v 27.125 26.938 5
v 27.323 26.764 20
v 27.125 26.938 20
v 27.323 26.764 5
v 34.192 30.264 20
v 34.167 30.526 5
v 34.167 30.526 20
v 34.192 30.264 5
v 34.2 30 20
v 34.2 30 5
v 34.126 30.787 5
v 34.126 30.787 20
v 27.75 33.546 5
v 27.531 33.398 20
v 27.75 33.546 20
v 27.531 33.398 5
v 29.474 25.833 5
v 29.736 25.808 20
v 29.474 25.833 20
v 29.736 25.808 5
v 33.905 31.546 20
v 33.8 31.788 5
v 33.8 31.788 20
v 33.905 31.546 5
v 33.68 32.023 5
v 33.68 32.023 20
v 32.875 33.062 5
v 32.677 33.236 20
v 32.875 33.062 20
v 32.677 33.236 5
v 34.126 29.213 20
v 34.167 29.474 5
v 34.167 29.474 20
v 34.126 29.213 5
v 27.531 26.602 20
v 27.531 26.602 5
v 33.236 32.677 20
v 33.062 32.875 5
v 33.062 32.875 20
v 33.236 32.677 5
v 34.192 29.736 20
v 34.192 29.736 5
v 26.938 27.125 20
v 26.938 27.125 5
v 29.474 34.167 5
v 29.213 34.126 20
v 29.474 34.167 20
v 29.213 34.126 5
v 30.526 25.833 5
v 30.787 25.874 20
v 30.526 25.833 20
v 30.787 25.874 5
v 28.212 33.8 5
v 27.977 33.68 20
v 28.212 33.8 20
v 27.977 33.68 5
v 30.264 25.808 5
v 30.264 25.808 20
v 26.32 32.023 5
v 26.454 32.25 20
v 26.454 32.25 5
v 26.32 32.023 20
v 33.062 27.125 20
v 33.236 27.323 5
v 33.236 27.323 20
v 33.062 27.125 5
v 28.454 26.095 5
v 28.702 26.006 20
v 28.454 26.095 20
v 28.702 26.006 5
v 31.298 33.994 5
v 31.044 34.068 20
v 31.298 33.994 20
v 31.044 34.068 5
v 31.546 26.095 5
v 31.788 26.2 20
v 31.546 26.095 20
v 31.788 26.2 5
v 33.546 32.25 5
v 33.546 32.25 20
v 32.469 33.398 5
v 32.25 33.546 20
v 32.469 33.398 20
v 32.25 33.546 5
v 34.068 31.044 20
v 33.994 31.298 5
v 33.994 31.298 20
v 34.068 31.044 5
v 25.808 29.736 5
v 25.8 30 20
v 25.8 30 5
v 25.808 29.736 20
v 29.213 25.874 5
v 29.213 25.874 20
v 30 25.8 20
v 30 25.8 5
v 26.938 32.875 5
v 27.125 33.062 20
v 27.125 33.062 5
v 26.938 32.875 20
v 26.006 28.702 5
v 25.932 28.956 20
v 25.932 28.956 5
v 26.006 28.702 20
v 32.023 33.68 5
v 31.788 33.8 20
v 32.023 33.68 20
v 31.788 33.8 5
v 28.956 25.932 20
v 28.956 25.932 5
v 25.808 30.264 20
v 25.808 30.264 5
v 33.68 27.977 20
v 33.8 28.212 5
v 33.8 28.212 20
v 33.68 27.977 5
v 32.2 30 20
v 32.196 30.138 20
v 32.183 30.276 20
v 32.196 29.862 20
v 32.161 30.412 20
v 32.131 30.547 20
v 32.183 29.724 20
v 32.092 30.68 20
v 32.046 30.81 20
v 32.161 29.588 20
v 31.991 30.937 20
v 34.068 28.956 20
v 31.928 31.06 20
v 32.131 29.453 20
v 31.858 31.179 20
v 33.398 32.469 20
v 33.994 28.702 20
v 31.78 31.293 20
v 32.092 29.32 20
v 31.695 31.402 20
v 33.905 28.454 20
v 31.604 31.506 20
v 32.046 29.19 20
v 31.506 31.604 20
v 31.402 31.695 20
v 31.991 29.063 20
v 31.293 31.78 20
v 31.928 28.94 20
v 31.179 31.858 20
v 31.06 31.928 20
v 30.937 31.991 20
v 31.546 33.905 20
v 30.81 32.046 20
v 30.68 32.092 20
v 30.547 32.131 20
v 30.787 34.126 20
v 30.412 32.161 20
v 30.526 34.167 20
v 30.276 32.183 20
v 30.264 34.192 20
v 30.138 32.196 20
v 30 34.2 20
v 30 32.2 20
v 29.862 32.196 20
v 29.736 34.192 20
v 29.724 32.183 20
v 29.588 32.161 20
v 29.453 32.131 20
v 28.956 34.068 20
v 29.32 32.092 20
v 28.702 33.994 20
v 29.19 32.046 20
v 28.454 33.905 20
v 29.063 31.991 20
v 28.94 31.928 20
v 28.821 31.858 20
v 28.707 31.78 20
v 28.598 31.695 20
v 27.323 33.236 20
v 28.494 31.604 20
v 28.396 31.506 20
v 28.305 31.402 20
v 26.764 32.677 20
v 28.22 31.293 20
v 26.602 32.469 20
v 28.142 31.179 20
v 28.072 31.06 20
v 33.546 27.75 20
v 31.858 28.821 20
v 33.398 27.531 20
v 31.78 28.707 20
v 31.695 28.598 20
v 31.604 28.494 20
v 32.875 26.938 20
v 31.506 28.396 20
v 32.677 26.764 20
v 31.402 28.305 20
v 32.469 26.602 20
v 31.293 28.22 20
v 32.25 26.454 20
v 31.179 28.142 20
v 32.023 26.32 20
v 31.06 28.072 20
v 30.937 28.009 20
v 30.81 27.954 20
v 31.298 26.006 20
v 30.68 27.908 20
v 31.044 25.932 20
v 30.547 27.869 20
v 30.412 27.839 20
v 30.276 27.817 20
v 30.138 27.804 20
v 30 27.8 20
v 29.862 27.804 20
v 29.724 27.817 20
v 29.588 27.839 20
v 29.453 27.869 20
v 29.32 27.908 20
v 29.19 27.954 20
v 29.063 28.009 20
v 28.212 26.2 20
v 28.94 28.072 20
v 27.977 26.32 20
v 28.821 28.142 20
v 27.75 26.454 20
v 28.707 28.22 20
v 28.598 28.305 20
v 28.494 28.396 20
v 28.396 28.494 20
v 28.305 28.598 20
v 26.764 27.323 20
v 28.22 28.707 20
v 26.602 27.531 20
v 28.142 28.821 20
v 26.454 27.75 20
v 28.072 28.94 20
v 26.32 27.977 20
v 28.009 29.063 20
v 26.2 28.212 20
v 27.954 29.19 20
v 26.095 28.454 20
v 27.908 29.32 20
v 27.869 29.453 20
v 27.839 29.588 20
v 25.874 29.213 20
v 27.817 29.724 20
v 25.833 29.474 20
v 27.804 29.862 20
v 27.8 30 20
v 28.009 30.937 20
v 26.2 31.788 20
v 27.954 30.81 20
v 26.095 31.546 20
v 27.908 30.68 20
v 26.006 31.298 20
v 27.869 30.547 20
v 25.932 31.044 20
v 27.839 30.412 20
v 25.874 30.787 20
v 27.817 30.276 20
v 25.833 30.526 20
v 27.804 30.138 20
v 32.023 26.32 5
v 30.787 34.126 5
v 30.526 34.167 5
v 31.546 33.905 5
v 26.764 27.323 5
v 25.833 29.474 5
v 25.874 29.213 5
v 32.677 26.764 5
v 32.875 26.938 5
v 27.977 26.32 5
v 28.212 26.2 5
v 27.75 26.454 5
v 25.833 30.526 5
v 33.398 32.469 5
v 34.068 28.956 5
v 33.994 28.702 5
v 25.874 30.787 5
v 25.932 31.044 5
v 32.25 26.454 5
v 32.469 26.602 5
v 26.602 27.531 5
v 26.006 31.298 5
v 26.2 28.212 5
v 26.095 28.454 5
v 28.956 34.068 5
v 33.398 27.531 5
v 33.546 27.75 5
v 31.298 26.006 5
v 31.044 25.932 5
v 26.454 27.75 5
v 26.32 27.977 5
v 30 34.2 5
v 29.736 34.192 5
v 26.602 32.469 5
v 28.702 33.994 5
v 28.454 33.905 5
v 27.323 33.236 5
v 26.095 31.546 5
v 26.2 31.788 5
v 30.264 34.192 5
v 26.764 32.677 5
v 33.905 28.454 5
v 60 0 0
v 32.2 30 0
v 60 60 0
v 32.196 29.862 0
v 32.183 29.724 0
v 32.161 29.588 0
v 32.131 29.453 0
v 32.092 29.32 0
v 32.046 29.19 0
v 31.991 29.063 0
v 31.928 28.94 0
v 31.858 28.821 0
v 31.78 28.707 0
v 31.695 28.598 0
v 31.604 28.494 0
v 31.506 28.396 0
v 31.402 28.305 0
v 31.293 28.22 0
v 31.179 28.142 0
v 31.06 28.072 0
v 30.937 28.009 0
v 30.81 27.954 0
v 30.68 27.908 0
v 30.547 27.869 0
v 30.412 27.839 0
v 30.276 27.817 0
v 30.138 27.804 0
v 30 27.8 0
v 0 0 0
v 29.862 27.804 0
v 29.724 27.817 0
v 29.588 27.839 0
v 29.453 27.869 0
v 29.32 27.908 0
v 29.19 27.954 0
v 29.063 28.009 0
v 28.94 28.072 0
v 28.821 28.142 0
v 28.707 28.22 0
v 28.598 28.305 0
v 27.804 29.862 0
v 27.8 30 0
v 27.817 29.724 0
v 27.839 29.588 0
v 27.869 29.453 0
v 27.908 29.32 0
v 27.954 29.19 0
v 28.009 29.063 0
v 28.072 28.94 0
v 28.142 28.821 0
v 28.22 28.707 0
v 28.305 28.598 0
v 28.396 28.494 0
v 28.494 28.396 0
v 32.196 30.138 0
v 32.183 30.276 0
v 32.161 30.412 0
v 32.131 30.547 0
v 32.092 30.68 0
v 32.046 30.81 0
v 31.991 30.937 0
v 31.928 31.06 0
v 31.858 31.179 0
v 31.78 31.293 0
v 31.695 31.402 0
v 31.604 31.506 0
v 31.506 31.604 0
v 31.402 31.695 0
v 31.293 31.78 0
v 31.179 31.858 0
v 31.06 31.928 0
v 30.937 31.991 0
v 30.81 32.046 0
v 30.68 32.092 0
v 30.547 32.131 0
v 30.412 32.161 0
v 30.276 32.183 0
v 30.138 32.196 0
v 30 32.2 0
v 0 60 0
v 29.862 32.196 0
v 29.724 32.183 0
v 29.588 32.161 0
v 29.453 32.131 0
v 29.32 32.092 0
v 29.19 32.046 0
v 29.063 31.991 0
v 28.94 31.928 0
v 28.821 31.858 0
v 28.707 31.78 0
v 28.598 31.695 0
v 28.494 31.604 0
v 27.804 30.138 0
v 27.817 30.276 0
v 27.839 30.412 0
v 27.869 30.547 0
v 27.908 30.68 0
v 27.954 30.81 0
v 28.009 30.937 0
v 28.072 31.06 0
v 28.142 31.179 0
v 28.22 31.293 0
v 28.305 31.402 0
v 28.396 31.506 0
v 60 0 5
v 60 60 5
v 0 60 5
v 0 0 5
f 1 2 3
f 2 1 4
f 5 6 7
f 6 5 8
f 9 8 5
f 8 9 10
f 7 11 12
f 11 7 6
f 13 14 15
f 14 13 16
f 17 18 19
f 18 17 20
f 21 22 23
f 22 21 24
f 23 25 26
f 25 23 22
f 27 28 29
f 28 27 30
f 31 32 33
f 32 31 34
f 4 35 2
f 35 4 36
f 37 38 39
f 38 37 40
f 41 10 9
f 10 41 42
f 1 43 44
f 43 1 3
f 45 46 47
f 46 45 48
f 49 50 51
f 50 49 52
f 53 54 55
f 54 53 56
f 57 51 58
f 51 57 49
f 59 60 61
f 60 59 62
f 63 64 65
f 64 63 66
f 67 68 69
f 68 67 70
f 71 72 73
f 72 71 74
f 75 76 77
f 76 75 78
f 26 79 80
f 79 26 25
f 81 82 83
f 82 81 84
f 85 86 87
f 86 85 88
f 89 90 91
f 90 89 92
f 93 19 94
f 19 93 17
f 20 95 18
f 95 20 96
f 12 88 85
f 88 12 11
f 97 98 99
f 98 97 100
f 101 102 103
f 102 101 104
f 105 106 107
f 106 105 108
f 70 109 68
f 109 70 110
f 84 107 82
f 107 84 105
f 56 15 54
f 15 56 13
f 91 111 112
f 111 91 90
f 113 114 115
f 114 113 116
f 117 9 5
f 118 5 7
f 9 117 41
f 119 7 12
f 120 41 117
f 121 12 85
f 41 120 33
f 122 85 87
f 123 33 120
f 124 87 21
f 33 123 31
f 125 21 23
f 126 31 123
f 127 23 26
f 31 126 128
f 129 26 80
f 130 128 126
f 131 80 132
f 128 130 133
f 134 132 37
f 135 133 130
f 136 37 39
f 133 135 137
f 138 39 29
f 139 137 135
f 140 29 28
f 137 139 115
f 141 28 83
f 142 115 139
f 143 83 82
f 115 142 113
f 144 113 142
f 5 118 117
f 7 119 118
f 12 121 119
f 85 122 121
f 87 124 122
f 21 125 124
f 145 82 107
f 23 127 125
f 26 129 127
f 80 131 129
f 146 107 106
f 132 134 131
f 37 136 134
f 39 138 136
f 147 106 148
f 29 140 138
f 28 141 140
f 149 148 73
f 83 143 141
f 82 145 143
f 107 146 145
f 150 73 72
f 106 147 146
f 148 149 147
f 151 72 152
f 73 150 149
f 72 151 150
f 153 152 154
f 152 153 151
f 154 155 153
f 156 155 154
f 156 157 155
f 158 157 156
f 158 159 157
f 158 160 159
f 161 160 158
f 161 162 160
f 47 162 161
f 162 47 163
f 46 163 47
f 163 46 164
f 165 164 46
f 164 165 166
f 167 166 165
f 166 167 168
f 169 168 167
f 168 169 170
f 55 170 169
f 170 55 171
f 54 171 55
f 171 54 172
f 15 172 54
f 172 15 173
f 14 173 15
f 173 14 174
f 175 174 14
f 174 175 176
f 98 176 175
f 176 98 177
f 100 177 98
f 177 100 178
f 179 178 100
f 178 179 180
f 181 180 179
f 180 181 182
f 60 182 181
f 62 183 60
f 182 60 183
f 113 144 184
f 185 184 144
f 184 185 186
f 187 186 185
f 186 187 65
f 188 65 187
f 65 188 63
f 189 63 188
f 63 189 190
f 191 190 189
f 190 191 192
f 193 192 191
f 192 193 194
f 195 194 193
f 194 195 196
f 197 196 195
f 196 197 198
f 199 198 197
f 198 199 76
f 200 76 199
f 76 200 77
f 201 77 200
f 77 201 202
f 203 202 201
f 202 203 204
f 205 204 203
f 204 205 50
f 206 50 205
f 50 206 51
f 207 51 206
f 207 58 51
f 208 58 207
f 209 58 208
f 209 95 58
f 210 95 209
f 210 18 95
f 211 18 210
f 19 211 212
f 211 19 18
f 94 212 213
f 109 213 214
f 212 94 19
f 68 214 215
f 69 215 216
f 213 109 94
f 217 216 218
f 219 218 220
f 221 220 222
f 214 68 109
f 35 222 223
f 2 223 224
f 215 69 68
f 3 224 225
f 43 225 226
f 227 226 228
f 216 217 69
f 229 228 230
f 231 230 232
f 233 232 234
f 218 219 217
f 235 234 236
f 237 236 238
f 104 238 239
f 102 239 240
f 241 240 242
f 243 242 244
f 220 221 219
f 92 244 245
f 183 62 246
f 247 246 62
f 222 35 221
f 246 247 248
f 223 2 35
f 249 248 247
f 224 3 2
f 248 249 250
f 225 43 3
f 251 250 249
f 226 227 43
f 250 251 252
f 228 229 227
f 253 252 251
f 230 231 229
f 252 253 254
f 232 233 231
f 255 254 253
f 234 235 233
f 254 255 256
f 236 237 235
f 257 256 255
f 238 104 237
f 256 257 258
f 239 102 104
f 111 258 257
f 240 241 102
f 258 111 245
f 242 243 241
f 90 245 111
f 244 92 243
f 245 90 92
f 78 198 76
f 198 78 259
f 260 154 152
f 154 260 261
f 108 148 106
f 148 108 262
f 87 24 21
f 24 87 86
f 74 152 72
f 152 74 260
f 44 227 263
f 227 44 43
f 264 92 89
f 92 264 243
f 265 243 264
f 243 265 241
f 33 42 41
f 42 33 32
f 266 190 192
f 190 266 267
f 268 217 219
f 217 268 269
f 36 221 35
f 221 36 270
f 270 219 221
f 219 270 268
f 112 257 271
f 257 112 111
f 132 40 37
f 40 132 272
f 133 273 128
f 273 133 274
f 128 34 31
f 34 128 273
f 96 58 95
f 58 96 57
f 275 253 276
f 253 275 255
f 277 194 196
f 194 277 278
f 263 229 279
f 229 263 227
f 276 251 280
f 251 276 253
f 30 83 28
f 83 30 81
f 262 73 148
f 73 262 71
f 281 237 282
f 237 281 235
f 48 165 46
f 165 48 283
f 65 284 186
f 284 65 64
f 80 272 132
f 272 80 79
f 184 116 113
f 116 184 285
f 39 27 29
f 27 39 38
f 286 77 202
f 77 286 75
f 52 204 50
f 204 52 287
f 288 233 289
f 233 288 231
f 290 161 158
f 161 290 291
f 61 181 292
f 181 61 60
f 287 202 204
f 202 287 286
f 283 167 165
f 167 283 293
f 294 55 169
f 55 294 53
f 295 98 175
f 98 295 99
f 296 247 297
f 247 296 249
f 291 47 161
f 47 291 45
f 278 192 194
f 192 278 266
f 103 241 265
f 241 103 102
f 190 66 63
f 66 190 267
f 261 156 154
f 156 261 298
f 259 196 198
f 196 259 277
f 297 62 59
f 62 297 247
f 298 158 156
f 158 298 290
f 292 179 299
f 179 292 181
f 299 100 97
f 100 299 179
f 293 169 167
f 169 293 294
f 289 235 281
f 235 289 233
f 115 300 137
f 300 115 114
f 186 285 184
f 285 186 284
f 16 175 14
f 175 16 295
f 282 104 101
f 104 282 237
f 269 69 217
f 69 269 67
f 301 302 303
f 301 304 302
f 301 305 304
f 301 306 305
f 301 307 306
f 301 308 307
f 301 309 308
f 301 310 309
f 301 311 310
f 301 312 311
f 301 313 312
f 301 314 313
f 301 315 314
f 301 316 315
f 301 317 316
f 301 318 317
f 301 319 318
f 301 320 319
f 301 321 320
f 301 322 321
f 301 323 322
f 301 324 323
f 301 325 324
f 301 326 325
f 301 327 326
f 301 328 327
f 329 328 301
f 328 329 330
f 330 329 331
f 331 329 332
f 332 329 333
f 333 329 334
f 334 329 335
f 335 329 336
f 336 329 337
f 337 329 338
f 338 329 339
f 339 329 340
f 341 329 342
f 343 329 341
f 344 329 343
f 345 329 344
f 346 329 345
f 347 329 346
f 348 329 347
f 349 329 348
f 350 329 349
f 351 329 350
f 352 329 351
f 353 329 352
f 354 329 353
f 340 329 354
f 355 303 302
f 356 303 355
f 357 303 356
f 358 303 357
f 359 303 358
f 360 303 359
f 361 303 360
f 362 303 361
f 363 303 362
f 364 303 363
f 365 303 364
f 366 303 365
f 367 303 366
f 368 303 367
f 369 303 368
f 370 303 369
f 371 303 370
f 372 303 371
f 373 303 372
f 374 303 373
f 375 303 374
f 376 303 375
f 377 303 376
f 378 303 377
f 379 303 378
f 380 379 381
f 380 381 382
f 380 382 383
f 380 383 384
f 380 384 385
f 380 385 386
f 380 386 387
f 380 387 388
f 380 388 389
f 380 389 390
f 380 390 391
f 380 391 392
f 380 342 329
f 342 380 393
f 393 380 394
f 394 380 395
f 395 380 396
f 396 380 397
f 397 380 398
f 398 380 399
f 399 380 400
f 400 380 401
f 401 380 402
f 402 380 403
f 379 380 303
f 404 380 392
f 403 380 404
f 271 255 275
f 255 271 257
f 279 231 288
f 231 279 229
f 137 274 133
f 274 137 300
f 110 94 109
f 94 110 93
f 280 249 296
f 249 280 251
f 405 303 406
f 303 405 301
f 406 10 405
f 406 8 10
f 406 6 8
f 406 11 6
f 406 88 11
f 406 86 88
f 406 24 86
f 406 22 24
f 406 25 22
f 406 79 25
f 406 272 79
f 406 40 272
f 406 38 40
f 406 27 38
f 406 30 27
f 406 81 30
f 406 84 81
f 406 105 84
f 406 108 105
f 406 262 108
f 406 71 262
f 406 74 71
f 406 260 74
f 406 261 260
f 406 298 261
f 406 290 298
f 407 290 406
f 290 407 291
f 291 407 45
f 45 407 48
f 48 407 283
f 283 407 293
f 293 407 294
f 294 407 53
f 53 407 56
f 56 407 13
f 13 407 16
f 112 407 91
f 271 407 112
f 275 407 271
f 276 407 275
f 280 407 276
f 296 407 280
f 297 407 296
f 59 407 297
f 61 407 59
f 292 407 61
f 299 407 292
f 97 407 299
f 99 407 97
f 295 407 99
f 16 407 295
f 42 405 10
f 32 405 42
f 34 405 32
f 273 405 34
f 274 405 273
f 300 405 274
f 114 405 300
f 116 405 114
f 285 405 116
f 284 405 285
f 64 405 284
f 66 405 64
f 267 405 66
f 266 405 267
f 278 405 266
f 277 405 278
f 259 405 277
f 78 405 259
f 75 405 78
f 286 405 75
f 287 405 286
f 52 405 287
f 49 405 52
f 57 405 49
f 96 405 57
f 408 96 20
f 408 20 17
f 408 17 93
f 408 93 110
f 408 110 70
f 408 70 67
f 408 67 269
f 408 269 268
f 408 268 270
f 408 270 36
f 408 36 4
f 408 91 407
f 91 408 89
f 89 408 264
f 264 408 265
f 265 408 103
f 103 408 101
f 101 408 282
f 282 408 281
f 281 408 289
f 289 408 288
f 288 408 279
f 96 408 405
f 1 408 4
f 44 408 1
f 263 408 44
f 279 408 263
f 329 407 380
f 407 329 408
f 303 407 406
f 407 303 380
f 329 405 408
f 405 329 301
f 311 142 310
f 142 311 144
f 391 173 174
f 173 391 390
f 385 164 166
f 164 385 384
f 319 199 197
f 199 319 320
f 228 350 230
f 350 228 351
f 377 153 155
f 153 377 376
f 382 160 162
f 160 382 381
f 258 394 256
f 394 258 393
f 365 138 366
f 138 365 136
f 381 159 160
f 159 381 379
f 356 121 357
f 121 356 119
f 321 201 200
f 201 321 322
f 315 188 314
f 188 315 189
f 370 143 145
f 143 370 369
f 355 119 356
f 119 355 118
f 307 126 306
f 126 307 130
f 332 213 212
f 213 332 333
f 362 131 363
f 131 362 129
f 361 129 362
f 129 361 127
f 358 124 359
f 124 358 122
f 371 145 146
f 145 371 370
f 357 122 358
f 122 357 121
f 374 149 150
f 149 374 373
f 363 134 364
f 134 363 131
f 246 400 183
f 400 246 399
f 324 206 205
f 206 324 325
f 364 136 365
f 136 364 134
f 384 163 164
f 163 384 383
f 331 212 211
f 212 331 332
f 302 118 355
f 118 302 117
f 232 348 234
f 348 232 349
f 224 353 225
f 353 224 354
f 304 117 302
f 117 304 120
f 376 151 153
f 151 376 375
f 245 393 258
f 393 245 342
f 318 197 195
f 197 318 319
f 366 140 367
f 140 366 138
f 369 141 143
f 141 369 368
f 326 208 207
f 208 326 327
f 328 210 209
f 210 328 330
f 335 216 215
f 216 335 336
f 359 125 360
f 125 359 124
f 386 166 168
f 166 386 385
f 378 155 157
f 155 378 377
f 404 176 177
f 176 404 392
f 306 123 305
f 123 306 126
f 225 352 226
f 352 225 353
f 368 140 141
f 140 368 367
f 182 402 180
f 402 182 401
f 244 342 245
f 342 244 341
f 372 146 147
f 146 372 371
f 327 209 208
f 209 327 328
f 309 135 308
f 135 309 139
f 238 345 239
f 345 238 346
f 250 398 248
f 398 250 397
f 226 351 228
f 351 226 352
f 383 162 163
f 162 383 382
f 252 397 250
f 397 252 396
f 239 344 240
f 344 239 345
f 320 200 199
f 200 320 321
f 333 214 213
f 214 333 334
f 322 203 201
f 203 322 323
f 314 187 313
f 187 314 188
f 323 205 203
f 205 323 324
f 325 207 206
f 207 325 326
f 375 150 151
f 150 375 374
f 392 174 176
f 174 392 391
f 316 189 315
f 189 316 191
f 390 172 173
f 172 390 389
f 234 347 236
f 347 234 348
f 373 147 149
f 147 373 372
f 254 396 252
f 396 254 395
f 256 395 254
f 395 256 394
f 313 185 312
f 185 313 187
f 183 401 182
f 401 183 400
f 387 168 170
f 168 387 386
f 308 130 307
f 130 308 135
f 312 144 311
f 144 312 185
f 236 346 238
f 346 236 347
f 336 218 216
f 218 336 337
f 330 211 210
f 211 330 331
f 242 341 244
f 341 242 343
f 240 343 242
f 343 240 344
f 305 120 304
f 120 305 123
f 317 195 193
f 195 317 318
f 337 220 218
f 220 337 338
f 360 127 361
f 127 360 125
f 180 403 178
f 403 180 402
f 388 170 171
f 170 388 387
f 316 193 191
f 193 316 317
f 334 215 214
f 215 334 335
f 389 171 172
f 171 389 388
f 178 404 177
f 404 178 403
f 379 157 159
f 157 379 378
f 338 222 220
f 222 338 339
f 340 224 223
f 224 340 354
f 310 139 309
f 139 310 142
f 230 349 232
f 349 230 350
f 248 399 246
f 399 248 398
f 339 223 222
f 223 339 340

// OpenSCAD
difference()
{
    union()
    {
        translate([30,30,0])
        cylinder(d=8.4,h=20,$fn=100);
        
        resize([60,60,5])
        cube();
    }
    
    translate([30,30,0])
    cylinder(d=4.4,h=20,$fn=100);
}
